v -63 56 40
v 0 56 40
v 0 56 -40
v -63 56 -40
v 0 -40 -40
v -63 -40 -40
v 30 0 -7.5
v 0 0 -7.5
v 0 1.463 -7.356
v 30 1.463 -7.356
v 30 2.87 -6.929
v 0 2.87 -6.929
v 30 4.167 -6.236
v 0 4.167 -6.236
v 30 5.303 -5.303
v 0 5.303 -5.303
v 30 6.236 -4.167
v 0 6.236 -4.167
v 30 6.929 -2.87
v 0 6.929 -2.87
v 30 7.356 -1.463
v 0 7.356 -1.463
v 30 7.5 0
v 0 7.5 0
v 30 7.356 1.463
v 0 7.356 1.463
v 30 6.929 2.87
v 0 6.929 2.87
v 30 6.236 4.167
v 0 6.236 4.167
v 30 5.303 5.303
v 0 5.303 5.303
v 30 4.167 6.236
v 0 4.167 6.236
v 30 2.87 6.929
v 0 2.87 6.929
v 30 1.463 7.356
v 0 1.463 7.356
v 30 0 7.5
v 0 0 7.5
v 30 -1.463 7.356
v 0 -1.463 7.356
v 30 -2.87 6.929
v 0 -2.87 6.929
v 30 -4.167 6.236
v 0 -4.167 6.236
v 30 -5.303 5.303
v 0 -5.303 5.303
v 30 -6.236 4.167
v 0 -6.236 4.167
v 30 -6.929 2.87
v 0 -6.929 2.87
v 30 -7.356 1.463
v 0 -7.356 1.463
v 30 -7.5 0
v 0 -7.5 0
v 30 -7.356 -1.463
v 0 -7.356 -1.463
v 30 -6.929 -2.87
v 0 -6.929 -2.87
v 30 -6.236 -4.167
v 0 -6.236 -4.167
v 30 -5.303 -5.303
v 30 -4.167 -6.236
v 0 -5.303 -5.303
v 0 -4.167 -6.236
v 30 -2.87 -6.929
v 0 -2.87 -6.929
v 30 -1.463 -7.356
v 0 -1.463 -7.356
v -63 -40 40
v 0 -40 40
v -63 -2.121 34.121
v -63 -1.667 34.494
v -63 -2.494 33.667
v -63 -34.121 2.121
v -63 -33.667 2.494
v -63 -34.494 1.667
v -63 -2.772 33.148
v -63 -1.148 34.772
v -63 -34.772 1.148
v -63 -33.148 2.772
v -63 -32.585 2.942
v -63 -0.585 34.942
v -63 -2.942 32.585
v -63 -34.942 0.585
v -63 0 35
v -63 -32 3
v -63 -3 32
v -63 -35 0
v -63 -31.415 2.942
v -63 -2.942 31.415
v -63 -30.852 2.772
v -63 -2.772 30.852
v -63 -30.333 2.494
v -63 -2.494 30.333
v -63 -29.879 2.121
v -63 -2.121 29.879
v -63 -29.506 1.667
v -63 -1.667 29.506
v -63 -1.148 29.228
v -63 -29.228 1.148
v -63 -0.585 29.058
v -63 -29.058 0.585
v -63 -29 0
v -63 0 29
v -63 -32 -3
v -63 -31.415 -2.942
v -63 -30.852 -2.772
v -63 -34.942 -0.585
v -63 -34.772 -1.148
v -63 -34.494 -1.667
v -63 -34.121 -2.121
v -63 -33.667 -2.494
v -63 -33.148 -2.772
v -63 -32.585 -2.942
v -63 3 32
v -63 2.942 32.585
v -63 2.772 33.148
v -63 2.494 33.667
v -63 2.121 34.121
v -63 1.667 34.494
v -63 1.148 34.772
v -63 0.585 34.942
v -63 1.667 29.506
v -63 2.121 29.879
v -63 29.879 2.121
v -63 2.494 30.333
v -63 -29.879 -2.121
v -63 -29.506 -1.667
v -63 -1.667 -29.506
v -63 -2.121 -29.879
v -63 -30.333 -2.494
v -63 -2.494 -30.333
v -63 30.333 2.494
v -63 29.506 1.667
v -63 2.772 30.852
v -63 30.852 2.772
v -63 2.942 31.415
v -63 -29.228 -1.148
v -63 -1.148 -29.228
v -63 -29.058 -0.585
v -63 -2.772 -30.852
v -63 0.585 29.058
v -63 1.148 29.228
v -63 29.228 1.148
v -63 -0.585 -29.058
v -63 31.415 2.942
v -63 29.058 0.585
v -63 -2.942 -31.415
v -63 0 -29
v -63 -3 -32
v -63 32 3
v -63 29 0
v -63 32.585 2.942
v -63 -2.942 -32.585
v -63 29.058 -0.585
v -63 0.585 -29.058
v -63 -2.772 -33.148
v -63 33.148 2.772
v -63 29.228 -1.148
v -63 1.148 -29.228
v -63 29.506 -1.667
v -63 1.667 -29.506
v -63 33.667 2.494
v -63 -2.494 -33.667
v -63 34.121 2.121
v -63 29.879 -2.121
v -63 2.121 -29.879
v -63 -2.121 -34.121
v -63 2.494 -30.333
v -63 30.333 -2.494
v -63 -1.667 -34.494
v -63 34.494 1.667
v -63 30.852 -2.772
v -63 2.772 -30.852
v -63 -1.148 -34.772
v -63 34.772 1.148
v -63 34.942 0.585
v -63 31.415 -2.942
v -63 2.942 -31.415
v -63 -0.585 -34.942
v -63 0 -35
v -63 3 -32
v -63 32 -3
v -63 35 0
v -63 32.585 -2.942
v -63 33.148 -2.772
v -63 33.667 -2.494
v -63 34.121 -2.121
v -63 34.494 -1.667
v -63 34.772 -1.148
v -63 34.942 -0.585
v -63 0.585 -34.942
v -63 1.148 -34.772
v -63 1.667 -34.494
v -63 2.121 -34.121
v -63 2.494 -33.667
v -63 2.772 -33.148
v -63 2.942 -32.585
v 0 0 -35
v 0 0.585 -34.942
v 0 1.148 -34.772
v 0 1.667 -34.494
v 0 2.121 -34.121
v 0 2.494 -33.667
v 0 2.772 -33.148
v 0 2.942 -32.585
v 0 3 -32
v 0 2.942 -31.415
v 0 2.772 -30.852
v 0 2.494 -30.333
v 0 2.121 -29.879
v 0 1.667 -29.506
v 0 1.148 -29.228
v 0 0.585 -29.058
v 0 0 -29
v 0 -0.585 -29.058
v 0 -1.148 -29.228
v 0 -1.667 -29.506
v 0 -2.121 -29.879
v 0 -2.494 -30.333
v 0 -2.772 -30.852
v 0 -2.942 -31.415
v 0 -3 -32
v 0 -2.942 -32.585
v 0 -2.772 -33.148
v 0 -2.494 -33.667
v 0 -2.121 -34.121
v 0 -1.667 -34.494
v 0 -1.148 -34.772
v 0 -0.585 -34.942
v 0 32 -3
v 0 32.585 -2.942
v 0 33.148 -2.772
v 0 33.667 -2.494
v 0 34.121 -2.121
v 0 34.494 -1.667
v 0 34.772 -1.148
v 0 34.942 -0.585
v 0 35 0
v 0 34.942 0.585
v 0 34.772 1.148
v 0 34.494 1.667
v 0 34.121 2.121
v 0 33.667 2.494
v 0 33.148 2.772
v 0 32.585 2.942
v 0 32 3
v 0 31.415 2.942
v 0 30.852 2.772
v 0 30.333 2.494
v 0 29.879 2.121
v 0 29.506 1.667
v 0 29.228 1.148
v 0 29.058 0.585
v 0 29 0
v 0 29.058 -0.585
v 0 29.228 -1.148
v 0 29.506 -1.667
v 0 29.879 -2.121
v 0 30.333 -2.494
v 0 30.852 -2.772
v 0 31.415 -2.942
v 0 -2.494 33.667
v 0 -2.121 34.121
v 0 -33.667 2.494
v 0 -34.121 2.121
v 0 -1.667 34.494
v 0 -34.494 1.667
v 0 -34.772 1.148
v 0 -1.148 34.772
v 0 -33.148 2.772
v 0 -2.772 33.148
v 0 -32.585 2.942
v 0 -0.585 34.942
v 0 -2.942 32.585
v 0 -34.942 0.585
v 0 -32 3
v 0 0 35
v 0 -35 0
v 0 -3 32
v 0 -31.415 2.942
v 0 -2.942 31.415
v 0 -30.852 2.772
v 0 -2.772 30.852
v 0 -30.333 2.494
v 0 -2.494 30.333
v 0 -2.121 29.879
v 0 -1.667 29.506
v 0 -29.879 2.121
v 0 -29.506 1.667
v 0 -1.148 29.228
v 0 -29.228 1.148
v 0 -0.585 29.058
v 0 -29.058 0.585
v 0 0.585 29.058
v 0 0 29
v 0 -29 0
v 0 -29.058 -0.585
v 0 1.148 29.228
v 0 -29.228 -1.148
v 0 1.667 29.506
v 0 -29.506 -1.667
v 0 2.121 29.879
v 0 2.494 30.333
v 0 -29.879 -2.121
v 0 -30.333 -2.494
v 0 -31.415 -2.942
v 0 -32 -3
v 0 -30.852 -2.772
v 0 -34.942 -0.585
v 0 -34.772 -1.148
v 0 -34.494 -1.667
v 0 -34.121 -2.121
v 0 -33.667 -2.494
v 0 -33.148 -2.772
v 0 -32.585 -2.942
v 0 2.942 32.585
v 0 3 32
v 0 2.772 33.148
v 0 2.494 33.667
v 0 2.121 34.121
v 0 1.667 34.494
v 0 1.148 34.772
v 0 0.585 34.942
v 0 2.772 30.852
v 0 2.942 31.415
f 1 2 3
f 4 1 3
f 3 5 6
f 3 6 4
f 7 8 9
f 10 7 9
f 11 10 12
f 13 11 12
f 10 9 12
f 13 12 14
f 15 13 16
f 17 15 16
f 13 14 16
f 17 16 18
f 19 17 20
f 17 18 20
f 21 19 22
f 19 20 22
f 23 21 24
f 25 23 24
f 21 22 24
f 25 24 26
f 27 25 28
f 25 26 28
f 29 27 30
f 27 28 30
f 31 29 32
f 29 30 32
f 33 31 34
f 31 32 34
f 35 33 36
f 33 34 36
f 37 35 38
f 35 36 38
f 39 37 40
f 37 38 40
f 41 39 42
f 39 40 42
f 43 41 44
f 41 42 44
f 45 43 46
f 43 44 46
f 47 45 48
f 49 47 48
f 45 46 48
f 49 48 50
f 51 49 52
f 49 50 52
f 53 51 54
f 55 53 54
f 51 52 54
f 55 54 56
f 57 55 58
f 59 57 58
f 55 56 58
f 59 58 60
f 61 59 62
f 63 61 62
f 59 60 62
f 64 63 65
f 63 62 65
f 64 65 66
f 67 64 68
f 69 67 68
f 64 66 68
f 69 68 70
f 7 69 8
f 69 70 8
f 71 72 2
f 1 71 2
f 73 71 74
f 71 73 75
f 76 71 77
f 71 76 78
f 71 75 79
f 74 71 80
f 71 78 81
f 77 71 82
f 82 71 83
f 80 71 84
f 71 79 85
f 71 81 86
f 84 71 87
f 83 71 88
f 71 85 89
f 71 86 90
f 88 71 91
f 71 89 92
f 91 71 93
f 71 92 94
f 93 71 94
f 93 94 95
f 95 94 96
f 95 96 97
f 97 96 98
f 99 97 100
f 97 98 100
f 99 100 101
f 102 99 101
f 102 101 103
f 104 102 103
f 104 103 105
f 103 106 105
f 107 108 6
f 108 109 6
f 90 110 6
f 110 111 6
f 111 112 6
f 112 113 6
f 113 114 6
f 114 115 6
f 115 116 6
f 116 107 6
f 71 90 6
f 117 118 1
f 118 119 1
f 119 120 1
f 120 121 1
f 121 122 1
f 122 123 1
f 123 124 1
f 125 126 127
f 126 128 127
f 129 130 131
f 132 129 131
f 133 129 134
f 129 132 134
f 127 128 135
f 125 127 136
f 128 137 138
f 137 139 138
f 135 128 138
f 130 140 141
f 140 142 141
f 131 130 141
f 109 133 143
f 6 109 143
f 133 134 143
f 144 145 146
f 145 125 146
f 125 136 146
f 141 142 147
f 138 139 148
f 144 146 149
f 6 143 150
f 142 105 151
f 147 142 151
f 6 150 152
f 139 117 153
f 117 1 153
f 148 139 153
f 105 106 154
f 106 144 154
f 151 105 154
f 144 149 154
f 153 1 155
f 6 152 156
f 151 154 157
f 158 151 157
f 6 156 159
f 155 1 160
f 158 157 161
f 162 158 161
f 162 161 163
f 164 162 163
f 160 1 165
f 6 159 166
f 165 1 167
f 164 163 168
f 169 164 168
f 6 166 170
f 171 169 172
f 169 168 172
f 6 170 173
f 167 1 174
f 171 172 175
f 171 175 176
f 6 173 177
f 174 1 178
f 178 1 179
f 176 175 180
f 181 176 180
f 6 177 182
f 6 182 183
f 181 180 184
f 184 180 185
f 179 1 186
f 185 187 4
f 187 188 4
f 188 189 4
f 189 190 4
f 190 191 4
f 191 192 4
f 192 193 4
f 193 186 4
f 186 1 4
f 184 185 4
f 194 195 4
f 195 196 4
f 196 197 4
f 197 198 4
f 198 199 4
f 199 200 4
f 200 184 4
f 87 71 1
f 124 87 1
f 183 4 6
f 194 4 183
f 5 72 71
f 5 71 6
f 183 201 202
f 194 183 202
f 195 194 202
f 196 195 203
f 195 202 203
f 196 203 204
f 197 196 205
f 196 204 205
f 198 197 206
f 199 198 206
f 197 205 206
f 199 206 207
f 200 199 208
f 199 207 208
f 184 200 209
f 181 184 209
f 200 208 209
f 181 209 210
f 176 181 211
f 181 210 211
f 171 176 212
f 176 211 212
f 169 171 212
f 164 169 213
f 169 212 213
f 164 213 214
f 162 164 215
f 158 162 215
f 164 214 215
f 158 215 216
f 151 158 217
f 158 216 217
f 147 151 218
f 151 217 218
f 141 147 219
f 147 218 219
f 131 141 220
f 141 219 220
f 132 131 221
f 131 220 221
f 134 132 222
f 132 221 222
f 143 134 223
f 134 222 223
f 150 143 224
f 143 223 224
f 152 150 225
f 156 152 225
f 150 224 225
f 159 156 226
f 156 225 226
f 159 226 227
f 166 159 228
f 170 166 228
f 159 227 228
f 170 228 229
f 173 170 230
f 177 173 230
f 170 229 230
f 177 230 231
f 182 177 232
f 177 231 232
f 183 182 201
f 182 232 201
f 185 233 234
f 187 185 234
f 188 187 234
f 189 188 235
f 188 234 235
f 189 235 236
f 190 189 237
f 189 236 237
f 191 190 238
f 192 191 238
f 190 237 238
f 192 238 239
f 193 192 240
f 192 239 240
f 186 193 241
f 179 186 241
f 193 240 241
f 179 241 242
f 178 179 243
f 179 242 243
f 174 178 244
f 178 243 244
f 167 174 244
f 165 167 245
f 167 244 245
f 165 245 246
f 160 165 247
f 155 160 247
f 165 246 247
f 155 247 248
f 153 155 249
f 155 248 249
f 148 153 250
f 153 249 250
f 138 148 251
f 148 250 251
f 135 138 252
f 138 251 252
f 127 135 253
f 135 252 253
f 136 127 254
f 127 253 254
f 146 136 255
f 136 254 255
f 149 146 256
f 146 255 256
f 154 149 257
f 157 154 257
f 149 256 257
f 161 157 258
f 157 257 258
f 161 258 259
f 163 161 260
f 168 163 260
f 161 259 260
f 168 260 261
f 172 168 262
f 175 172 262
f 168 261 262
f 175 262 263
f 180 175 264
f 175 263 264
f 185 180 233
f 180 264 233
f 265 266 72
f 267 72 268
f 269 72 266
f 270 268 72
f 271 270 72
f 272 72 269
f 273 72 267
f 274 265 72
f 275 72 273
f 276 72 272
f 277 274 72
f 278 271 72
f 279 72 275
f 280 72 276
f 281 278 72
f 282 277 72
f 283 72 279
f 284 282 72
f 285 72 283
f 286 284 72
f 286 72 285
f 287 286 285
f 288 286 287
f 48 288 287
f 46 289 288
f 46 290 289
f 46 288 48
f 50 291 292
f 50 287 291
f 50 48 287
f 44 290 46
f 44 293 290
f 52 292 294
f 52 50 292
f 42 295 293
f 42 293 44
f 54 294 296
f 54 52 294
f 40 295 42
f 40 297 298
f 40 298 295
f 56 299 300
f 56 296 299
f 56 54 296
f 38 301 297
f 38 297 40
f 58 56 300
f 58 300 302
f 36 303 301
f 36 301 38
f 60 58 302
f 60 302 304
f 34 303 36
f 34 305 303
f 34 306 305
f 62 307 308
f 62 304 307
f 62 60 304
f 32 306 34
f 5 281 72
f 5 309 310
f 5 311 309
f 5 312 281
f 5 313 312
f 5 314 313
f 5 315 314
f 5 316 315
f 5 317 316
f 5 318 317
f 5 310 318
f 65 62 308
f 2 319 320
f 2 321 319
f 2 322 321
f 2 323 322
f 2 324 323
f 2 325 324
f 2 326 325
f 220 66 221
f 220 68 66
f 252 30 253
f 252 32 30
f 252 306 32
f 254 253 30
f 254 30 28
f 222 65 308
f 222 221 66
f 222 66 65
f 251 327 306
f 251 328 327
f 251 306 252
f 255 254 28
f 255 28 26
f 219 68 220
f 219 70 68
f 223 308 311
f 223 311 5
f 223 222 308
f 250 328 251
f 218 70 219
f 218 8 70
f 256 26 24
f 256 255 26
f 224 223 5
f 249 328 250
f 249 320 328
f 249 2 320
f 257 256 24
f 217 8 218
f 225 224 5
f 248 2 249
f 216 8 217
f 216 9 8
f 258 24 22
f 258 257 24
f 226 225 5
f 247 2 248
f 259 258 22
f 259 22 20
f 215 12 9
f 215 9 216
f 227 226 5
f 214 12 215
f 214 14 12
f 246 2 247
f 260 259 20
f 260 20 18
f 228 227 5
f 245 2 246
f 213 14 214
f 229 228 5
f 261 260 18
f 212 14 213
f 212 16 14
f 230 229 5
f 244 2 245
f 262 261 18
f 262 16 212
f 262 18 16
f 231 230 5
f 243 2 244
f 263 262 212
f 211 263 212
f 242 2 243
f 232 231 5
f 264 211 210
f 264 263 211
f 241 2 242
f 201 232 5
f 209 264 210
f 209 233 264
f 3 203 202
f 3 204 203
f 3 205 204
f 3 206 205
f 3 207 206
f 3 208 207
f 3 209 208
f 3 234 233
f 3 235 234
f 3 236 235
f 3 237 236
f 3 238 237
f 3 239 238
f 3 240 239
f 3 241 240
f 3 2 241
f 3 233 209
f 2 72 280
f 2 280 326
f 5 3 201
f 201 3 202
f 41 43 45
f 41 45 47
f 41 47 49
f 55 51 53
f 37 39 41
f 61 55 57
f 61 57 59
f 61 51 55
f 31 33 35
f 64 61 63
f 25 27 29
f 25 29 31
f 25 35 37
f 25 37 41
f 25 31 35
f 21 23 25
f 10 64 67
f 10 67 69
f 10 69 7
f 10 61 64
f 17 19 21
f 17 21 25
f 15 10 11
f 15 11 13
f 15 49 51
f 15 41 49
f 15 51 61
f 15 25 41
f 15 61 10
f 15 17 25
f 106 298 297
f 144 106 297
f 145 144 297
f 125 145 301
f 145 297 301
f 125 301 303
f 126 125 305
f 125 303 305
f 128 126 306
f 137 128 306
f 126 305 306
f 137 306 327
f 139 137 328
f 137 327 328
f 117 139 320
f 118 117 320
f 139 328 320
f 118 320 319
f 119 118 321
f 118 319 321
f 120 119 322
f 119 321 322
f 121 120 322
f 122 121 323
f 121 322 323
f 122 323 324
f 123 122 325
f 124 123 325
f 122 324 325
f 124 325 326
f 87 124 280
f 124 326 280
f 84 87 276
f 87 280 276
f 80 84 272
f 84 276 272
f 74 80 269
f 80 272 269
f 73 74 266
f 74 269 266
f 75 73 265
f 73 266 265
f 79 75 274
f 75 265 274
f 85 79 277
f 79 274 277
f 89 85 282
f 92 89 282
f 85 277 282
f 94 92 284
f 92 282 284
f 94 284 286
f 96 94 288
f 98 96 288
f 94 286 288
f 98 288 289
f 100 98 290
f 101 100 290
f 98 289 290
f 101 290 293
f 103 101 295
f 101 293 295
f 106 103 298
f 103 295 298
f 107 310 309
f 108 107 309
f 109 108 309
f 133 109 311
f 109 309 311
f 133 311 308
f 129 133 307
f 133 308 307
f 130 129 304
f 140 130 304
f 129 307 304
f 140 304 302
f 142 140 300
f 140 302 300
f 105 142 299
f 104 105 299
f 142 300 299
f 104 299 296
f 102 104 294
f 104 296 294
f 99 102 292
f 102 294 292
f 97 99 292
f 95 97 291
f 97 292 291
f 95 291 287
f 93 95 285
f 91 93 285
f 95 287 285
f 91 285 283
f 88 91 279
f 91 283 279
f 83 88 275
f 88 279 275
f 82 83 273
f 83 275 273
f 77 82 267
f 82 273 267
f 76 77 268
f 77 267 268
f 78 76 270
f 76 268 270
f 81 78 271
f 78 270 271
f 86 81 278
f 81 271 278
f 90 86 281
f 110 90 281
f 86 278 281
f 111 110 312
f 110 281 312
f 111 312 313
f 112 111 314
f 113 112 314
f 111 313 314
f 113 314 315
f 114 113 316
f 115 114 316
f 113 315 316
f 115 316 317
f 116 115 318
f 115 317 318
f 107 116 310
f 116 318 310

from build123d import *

# Parameters (mm, degrees)
SKETCH1_W           = 80
SKETCH1_H           = 96
SKETCH1_R           = 3
BOSS_EXTRUDE1_DEPTH = 63
SKETCH2_R           = 7.5
BOSS_EXTRUDE2_DEPTH = 30


with BuildPart() as part:
    # Sketch1 → Boss-Extrude1 (new body)
    with BuildSketch(Plane(origin=(0, 0, 0), x_dir=(0, 0, -1), z_dir=(1, 0, 0))):
        with Locations((0, 8)):
            Rectangle(SKETCH1_W, SKETCH1_H)
        with Locations((0, 32)):
            Circle(SKETCH1_R, mode=Mode.SUBTRACT)
        with Locations((-32, 0)):
            Circle(SKETCH1_R, mode=Mode.SUBTRACT)
        with Locations((0, -32)):
            Circle(SKETCH1_R, mode=Mode.SUBTRACT)
        with Locations((32, 0)):
            Circle(SKETCH1_R, mode=Mode.SUBTRACT)
    extrude(amount=-BOSS_EXTRUDE1_DEPTH)

    # Sketch2 → Boss-Extrude2 (add)
    with BuildSketch(Plane(origin=(0, 0, 0), x_dir=(0, 0, -1), z_dir=(1, 0, 0))):
        Circle(SKETCH2_R)
    extrude(amount=BOSS_EXTRUDE2_DEPTH)


solid = part.part
